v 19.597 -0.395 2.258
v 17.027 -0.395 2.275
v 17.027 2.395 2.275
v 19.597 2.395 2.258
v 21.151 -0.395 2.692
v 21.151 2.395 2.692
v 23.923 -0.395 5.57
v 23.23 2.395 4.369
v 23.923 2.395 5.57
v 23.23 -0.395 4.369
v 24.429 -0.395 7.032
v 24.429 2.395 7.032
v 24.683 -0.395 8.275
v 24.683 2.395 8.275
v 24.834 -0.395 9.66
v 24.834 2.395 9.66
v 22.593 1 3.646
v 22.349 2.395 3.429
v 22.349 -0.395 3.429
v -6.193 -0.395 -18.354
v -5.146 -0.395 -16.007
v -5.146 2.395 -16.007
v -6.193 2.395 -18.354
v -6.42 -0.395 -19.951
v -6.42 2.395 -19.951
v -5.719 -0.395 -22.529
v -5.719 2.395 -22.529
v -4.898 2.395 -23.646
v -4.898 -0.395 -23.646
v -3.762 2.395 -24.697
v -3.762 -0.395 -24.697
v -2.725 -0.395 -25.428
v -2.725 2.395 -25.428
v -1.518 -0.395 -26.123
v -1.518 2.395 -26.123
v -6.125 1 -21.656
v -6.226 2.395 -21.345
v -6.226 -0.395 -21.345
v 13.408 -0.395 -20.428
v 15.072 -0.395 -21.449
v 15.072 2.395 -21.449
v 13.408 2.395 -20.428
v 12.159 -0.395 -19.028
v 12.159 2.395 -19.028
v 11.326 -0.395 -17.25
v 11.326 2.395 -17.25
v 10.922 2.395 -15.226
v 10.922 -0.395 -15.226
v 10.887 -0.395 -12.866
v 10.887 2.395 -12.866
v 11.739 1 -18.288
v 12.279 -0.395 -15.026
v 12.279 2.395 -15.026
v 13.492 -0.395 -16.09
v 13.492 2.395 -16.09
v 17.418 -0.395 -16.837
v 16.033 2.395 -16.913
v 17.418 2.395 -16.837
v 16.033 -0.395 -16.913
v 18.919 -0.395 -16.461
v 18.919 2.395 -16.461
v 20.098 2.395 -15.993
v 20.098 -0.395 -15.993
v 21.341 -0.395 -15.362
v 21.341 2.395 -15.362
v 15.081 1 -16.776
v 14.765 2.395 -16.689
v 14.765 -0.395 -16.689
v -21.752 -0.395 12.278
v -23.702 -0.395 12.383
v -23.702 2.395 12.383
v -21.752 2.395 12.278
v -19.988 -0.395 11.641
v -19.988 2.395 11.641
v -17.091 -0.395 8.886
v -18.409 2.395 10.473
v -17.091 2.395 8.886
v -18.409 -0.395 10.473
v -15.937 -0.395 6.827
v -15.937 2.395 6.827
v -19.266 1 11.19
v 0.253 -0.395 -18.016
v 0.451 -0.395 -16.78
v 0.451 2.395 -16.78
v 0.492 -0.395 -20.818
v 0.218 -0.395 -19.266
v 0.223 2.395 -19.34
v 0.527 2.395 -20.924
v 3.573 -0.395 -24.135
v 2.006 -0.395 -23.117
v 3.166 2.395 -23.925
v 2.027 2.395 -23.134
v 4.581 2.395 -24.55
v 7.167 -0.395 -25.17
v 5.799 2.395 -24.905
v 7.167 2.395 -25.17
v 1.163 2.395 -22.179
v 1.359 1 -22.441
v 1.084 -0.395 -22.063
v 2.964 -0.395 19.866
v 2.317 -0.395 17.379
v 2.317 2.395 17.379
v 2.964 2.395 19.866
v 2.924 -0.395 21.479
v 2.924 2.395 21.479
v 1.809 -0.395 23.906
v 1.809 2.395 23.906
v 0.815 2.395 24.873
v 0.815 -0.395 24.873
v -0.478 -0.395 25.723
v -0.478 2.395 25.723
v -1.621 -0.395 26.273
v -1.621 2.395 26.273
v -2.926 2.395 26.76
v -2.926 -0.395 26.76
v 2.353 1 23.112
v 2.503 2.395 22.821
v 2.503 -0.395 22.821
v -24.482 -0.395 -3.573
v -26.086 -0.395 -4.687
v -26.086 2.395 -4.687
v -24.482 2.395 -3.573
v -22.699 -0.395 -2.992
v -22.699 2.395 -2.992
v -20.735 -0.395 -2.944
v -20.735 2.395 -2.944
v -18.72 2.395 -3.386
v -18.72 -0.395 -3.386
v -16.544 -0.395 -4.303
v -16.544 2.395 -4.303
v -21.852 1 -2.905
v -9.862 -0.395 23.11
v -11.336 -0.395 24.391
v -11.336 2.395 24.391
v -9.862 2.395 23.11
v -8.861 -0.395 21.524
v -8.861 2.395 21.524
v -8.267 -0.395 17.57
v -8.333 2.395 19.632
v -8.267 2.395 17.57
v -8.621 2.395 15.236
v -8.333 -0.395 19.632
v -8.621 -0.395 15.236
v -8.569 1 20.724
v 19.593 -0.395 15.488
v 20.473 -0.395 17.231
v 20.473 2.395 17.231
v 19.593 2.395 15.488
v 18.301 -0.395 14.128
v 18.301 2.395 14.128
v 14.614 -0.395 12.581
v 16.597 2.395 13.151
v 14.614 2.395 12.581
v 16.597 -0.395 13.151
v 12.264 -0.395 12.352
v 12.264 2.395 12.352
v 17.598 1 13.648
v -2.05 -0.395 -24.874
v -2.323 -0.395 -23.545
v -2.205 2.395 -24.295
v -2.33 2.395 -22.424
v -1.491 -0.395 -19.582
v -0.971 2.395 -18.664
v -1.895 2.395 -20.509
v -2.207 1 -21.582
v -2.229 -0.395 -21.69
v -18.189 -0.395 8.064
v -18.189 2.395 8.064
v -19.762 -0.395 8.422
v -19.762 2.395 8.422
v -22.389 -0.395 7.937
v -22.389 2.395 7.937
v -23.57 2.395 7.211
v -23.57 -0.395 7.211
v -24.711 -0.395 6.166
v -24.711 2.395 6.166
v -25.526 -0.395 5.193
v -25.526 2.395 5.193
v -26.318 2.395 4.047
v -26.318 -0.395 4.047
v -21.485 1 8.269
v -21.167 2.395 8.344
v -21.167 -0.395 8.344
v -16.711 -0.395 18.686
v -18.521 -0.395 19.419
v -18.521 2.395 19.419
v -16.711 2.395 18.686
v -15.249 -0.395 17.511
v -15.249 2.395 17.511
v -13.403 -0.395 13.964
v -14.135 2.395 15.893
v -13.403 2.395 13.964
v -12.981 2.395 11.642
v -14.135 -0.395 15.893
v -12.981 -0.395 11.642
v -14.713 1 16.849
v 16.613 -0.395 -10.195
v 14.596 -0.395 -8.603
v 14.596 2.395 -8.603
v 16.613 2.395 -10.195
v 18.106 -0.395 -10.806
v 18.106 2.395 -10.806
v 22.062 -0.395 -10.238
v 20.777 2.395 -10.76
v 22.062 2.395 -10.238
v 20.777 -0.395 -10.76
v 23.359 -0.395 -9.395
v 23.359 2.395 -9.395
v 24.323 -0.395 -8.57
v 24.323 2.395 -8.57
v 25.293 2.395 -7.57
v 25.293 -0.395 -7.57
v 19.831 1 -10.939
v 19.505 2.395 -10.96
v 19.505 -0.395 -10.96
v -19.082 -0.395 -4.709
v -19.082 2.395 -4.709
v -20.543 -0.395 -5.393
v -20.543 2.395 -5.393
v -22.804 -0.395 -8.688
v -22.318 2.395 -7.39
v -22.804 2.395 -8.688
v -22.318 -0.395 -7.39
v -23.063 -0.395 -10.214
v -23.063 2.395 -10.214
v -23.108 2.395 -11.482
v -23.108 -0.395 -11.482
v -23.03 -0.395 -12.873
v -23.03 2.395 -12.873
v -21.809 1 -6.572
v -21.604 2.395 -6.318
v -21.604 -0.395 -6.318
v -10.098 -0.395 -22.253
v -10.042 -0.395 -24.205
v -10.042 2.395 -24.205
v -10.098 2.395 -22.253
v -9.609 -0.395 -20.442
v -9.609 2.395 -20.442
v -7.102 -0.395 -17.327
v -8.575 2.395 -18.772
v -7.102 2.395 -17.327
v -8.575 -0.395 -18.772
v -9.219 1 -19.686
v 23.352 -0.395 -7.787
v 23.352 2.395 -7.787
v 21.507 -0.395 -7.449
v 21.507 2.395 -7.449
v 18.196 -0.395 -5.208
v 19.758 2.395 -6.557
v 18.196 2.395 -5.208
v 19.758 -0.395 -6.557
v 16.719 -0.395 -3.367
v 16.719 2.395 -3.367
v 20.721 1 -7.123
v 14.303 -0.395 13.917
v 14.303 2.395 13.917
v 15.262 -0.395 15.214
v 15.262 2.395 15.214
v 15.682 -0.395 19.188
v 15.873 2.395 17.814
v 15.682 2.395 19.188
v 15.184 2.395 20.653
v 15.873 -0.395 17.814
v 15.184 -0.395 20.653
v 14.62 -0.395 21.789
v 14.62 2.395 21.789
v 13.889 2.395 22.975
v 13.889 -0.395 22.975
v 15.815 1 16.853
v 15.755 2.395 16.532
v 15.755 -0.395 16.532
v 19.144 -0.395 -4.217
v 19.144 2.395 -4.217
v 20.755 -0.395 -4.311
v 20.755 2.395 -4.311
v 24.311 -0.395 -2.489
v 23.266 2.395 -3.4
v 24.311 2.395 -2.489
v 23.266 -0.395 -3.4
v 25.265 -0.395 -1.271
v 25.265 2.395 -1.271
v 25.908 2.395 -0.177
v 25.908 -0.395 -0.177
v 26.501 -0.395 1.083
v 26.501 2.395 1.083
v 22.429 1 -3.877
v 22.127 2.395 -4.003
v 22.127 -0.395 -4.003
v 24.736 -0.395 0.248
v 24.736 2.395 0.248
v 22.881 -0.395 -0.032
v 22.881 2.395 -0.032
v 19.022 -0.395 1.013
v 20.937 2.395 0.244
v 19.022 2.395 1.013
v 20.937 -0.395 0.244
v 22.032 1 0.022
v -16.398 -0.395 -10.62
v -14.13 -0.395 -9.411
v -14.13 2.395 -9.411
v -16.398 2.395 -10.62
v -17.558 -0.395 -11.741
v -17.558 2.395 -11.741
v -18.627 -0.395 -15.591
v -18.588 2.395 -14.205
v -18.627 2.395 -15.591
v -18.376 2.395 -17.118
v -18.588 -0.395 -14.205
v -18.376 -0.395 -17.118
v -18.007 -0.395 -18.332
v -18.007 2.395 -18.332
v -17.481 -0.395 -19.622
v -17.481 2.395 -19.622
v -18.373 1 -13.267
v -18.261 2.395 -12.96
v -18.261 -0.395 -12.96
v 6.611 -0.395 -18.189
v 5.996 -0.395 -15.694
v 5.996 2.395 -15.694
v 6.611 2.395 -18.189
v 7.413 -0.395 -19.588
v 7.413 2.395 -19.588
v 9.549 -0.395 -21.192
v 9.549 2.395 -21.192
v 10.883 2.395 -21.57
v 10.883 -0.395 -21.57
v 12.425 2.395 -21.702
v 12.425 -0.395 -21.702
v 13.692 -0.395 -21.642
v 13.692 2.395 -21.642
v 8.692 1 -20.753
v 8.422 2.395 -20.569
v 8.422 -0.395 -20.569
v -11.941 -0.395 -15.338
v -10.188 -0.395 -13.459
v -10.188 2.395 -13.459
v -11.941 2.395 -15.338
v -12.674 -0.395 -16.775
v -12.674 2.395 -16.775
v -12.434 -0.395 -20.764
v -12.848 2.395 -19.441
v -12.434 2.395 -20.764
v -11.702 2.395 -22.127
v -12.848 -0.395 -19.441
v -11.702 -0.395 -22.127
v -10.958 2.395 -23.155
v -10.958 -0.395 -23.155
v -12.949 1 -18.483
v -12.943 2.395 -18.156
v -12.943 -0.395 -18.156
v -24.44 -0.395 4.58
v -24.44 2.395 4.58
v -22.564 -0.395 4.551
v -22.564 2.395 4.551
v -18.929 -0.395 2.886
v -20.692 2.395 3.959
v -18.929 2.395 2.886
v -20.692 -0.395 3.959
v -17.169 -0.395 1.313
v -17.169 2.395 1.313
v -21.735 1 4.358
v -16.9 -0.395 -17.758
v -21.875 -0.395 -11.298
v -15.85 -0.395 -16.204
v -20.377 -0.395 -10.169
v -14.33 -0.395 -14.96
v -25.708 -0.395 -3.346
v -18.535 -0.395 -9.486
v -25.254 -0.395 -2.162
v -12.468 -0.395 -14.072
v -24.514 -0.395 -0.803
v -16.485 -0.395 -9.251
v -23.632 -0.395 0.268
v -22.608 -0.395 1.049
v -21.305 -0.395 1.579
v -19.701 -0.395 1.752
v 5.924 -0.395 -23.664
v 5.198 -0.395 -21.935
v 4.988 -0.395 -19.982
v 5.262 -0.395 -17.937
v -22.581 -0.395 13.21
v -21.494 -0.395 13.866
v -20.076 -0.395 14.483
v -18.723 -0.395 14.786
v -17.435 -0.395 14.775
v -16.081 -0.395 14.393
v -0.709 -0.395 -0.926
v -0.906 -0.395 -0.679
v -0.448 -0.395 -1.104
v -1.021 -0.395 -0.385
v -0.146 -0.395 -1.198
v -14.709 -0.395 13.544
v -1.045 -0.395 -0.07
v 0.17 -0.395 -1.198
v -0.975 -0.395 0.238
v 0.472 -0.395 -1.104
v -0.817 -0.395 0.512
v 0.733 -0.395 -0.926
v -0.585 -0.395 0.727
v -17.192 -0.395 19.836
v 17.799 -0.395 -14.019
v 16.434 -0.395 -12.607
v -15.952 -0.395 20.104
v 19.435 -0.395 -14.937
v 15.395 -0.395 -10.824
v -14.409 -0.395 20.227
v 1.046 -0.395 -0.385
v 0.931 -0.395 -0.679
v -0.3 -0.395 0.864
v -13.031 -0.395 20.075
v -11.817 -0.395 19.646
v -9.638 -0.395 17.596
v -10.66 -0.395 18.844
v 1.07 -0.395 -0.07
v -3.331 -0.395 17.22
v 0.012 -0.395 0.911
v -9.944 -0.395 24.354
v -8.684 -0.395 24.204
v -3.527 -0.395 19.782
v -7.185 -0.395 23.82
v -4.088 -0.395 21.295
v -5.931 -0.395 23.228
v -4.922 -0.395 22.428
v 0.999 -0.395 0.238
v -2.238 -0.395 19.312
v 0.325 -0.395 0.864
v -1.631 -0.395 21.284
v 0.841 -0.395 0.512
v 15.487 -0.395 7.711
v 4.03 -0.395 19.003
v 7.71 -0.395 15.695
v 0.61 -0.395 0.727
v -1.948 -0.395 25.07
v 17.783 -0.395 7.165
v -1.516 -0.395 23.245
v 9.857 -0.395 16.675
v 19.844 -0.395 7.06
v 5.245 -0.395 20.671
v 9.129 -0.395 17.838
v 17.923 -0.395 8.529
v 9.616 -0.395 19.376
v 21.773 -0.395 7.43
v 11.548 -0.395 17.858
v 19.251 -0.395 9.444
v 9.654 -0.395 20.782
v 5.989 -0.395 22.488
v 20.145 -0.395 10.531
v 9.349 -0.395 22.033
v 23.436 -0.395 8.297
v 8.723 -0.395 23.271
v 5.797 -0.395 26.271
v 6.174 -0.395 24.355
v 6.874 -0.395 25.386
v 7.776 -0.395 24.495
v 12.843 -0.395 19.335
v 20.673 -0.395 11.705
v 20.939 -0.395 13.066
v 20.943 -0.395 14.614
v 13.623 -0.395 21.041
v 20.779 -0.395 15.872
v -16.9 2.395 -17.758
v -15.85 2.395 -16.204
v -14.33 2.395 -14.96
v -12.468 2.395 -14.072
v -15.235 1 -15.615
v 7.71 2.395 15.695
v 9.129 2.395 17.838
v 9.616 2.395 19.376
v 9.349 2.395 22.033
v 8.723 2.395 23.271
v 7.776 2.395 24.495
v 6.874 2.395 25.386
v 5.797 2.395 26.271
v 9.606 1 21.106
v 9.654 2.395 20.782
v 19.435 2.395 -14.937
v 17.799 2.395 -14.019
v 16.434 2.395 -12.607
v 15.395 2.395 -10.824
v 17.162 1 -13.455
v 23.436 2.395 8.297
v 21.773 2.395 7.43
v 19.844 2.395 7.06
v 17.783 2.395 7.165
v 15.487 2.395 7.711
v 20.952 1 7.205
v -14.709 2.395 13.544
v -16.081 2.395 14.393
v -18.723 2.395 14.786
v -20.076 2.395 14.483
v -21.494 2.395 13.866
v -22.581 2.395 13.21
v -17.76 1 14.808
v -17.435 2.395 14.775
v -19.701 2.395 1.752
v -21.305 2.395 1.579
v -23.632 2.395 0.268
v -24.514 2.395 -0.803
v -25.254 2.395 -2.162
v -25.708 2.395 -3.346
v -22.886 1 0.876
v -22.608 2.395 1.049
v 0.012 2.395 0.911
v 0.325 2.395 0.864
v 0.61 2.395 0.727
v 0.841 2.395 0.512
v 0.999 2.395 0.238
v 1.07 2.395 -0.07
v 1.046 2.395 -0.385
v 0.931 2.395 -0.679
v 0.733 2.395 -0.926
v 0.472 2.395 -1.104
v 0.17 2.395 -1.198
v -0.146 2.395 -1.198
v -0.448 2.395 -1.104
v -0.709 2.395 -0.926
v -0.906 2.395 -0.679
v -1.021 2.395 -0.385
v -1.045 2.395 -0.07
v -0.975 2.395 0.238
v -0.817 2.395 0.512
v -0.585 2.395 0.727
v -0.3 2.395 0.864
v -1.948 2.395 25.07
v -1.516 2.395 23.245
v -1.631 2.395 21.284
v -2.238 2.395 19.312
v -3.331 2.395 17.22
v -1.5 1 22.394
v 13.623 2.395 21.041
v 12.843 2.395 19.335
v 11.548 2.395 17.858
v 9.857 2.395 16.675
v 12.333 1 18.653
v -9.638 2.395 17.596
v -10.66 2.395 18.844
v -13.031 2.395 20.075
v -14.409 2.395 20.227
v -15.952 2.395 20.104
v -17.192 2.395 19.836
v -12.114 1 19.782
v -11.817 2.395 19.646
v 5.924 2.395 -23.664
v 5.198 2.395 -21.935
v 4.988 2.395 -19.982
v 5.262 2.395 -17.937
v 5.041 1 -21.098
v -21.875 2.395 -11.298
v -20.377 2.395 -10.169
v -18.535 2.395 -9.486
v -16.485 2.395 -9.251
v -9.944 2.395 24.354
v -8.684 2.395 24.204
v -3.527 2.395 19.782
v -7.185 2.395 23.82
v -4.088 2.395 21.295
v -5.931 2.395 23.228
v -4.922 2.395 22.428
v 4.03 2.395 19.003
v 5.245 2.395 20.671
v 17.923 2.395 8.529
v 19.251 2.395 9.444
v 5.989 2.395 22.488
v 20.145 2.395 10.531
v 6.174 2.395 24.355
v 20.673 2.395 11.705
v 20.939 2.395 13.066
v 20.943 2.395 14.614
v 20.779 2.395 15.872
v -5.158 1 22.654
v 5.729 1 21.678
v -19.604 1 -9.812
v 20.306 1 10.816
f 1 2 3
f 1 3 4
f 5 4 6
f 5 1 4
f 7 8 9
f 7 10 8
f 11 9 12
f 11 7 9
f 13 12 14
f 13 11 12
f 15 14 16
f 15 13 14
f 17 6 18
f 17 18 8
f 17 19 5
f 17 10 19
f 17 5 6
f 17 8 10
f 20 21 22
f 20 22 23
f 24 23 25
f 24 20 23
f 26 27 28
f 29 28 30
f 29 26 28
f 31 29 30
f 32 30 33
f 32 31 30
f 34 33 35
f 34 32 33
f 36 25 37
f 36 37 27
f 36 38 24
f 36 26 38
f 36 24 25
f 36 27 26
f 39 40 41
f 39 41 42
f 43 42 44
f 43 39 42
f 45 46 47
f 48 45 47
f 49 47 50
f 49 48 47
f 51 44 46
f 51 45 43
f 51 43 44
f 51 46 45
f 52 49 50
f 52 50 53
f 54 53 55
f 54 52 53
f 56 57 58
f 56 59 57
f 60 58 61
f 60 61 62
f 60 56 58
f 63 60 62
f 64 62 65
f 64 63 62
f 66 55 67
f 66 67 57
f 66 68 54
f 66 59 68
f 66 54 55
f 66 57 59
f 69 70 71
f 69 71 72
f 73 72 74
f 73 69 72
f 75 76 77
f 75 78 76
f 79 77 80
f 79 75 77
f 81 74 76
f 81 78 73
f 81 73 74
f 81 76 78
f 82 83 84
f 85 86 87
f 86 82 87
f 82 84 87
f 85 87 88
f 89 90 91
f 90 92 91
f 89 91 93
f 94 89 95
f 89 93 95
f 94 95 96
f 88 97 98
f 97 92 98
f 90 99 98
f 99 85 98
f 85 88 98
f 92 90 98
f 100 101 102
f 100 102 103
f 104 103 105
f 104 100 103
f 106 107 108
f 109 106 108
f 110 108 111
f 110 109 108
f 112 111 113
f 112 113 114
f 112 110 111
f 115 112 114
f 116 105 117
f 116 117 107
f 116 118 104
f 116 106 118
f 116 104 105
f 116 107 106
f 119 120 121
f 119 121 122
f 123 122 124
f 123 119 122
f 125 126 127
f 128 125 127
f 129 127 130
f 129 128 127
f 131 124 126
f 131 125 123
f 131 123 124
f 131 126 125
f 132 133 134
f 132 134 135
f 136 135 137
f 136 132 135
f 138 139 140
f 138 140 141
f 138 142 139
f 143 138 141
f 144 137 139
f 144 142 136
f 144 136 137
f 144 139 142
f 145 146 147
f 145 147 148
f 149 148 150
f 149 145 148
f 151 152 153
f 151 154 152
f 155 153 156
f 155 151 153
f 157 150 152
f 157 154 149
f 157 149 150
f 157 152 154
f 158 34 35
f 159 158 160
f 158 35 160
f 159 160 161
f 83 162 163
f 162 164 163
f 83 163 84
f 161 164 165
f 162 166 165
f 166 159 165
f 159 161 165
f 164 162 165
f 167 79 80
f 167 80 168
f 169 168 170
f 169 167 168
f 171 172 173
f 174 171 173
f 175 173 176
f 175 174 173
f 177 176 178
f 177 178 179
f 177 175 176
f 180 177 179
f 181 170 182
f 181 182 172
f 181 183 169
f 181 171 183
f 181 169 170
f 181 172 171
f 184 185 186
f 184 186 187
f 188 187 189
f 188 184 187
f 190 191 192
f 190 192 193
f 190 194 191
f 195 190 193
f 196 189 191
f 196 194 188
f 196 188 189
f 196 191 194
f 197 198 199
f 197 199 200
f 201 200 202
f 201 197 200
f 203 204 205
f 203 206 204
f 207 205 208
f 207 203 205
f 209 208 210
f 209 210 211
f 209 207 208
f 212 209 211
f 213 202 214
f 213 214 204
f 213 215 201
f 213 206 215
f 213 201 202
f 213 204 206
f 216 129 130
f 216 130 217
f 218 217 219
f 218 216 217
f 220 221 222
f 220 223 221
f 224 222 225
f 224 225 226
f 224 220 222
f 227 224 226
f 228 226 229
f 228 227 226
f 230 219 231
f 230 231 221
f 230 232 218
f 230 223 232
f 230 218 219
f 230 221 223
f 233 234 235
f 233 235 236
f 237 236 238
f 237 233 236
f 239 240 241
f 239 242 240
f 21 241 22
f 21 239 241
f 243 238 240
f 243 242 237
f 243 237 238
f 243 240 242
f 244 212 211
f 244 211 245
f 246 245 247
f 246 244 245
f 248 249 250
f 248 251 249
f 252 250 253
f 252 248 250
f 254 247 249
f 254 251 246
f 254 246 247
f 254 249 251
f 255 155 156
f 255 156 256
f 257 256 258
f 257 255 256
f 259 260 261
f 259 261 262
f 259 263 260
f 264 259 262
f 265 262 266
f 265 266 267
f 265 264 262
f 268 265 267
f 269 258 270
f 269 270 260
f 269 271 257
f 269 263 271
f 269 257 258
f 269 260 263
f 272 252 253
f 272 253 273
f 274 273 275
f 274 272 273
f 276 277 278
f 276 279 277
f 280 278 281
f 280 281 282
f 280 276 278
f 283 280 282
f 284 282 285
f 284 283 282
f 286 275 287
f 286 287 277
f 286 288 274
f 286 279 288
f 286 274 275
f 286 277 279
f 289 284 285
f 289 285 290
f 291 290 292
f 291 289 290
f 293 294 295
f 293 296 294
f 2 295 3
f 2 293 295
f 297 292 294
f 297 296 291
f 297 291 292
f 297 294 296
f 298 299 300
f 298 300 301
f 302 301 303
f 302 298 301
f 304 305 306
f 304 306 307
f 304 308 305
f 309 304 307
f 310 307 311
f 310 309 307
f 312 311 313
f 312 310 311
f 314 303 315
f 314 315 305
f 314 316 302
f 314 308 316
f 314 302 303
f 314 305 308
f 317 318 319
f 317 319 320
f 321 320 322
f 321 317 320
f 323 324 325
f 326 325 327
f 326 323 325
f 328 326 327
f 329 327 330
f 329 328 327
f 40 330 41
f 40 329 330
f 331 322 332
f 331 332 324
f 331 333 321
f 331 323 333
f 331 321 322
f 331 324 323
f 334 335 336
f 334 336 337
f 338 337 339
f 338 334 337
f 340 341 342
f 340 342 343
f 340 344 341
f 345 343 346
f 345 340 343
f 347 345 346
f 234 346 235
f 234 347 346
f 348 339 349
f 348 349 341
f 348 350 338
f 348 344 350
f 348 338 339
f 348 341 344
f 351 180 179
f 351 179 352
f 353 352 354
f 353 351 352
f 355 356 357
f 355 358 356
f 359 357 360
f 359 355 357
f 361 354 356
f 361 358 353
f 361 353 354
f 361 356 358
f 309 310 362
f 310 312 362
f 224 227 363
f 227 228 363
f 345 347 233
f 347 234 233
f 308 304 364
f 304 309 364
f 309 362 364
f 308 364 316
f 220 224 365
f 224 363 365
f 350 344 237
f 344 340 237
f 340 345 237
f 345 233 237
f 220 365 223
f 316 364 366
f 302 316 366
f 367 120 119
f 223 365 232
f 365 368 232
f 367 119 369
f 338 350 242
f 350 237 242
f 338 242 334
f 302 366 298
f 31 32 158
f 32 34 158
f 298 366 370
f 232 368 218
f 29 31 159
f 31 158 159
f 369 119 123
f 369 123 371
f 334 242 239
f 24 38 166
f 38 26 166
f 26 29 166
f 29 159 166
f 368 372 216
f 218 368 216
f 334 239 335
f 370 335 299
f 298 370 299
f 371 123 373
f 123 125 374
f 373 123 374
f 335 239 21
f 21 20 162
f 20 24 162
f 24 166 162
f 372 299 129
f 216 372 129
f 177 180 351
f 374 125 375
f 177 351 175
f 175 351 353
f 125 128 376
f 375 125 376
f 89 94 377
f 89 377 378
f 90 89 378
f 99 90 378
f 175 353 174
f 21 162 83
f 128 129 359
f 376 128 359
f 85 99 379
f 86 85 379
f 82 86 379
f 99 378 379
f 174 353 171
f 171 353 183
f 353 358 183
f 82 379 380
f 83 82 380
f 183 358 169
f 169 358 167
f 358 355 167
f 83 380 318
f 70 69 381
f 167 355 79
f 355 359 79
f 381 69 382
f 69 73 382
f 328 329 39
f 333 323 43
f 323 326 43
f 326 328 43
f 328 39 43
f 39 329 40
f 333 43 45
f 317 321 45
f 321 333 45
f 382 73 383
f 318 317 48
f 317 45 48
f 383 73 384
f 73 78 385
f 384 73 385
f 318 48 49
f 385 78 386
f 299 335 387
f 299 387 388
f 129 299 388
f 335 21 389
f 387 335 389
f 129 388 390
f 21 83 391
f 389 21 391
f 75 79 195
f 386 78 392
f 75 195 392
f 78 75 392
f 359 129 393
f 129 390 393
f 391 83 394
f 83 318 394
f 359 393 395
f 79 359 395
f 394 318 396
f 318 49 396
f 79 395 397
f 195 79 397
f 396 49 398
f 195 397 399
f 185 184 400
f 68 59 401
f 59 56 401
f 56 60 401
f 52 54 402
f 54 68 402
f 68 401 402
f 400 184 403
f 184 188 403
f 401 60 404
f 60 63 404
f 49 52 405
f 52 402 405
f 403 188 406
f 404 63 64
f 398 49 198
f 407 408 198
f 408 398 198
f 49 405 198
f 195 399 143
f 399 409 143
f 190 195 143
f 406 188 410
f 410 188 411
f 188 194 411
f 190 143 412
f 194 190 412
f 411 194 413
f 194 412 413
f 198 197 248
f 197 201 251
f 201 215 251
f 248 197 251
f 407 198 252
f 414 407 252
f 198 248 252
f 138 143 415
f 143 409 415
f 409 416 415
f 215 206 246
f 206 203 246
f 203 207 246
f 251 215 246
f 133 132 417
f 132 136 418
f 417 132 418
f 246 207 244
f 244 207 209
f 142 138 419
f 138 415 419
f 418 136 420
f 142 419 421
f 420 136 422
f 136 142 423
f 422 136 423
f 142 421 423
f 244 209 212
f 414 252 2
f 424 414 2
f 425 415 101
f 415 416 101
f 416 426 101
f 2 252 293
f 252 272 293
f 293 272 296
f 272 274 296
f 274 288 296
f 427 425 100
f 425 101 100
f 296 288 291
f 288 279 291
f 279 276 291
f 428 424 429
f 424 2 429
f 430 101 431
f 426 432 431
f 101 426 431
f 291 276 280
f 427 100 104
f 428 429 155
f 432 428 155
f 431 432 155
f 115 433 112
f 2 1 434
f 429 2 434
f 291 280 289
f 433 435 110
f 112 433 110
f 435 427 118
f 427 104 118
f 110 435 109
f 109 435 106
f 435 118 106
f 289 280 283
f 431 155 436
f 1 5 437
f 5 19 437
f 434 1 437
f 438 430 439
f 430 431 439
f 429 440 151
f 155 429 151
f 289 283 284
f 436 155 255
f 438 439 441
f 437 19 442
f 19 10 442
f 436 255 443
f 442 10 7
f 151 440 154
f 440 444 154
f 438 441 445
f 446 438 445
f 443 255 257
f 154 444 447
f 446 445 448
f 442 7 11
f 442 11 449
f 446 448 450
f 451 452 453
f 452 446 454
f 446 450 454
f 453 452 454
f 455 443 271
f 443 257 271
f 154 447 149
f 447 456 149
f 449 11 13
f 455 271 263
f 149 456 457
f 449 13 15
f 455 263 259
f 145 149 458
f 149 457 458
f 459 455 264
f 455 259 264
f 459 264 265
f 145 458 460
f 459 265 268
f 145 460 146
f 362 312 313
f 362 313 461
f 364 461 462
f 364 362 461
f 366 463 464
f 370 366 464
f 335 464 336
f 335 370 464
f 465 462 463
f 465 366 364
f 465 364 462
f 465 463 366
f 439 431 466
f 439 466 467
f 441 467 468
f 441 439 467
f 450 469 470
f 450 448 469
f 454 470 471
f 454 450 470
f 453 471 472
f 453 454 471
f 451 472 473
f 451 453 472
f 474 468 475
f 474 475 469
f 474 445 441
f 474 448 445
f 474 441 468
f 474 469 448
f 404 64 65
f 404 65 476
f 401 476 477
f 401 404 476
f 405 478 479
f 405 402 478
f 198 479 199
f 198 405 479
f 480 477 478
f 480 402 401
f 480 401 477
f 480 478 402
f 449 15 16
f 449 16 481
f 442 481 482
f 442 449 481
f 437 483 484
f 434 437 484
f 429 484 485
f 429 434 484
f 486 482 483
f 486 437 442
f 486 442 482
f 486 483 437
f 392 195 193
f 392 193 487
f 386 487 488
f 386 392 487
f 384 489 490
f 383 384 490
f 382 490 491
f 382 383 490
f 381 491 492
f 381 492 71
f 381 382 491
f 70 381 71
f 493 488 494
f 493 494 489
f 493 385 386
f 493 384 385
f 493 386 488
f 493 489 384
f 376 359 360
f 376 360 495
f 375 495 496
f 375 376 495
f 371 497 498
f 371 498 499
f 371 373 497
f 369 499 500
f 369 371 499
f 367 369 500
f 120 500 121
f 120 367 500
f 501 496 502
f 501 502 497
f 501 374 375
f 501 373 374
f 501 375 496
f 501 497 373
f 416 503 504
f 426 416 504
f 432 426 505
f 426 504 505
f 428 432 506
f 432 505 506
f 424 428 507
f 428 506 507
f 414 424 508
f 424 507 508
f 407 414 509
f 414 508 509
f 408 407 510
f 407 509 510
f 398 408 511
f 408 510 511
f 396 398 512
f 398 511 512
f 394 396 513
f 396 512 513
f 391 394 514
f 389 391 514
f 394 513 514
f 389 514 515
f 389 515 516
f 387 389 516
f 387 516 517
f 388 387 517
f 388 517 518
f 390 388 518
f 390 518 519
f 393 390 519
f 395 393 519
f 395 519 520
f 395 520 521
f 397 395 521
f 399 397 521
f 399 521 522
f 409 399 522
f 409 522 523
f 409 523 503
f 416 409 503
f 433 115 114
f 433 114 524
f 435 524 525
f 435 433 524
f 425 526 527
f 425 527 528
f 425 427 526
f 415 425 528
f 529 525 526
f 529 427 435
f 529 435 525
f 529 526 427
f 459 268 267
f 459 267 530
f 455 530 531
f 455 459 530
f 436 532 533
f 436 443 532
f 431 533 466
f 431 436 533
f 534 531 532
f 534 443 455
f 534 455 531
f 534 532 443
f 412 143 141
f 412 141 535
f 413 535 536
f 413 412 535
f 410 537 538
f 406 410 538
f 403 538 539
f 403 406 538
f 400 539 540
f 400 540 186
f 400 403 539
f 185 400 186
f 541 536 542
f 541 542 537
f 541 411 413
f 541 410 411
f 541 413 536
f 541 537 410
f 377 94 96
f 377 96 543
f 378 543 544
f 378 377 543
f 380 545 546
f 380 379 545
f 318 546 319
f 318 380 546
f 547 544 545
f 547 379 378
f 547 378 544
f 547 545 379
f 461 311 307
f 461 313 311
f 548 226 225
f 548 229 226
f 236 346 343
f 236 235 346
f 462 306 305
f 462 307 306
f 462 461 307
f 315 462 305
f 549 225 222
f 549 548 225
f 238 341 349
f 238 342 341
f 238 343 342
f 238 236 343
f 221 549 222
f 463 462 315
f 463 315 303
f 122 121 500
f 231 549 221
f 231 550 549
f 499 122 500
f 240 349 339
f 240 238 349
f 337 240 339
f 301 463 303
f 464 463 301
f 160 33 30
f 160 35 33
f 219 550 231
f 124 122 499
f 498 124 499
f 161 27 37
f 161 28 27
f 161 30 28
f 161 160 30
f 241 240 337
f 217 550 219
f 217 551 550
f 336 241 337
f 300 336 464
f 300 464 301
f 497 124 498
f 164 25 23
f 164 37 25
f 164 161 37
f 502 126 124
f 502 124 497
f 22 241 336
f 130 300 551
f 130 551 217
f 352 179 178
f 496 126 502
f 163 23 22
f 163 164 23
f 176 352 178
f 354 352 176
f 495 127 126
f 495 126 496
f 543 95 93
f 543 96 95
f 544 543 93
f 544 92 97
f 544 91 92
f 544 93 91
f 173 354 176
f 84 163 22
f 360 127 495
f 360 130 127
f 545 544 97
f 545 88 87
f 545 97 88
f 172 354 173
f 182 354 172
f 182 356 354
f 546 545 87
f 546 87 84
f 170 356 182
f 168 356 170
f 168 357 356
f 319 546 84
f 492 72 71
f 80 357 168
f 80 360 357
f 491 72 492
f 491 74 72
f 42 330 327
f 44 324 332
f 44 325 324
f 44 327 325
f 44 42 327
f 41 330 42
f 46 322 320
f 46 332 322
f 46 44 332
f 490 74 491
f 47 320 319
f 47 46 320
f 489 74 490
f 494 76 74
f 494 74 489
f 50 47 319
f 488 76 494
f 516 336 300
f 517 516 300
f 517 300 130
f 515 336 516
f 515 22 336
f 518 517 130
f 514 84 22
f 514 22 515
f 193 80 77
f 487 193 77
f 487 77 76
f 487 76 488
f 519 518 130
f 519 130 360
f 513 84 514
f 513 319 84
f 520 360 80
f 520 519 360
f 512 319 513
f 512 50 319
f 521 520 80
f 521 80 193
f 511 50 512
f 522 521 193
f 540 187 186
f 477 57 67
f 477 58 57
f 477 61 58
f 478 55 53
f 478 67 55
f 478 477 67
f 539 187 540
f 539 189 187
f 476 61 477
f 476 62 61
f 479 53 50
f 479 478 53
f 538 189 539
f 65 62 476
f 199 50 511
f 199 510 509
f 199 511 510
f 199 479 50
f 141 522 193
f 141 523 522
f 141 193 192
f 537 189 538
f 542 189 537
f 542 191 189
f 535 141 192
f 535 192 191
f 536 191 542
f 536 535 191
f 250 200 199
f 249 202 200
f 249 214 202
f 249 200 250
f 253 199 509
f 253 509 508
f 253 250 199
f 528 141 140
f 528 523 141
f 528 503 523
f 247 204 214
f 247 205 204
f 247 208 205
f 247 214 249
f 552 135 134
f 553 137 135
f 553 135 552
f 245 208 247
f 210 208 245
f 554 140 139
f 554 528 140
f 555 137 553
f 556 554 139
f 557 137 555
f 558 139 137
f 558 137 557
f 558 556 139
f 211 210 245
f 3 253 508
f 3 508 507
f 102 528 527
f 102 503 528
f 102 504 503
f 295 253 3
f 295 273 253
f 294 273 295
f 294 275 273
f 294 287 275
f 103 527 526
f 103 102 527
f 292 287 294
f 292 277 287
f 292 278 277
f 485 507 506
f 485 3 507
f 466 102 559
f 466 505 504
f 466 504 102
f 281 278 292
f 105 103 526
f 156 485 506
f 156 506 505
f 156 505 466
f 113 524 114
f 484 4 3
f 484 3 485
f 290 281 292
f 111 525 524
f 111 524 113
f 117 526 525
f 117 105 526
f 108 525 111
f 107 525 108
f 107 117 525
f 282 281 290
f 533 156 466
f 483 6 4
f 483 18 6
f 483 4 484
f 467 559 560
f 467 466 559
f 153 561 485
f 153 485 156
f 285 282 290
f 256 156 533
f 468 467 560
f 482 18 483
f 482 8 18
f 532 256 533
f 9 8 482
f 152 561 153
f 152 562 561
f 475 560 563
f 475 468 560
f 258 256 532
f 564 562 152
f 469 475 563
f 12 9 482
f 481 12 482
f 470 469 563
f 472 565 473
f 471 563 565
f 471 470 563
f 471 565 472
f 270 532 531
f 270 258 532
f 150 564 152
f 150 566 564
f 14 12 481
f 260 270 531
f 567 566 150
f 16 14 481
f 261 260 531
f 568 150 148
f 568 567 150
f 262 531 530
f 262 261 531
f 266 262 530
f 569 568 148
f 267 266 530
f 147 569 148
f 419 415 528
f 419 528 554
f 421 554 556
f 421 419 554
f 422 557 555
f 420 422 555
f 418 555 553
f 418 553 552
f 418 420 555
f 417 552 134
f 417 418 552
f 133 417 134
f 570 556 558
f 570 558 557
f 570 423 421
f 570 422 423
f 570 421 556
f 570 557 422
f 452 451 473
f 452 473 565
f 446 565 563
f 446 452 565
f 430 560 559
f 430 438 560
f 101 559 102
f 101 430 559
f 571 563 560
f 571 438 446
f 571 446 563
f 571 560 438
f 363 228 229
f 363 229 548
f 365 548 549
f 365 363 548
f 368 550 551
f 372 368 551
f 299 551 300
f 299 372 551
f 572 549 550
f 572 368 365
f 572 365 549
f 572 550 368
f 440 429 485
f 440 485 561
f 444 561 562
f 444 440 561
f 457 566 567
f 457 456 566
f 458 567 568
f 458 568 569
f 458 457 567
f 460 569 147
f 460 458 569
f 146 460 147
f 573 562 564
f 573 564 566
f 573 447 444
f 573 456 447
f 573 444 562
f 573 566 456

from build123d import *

# Parameters (mm, degrees)
SKETCH1_R           = 20
BOSS_EXTRUDE1_DEPTH = 2
CUT_EXTRUDE10_DEPTH = 29.354893758
CIRPATTERN1_DEPTH   = 2
SKETCH5_R           = 0.76
CUT_EXTRUDE11_DEPTH = 28.141520821
SCALE1_SCALE        = 1.5
SCALE2_SCALE        = 0.93


# Read off the part's stored shape, not the designer's step: CirPattern1
with BuildPart() as part:
    # Sketch1 → Boss-Extrude1 (new body)
    with BuildSketch(Plane(origin=(0, 0, 0), x_dir=(1, 0, 0), z_dir=(0, 1, 0))):
        with Locations(Location((0, 0, 0), (0, 0, 270))):
            Circle(SKETCH1_R)
    extrude(amount=BOSS_EXTRUDE1_DEPTH)

    # Sketch3 → Cut-Extrude10 (cut, through all)
    with BuildSketch(Plane(origin=(0, 2, 0), x_dir=(1, 0, 0), z_dir=(0, 1, 0))):
        with BuildLine():
            Line((-0.11374729, 19.999676536), (2.525531299, 21.841438752))
            Line((2.525531299, 21.841438752), (8.448237607, 18.128079913))
            add(Edge.make_bspline(
                [(0.314716636, 11.921594207), (-1.061906761, 18.280624108), (8.448237607, 18.128079913)],
                knots=[0, 0, 0, 1, 1, 1], degree=2))
            add(Edge.make_bspline(
                [(-0.11374729, 19.999676536), (-3.476973379, 16.23883842), (0.314716636, 11.921594207)],
                knots=[0, 0, 0, 1, 1, 1], degree=2))
        make_face()
    extrude(amount=-CUT_EXTRUDE10_DEPTH, mode=Mode.SUBTRACT)

    # CirPattern1 outline → CirPattern1 (cut)
    with BuildSketch(Plane(origin=(0, 0, 0), x_dir=(1, 0, 0), z_dir=(0, 1, 0))):
        with BuildLine():
            add(Edge.make_bspline(
                [(-7.207557435, 17.244057808), (-7.782239787, 13.703261178), (-3.697405485, 11.367556407)],
                knots=[0.181076354, 0.181076354, 0.181076354, 1, 1, 1], degree=2))
            add(Edge.make_bspline(
                [(-3.697405485, 11.367556407), (-6.402099222, 15.840148745), (-1.097148713, 18.619435028)],
                knots=[0, 0, 0, 0.803340706, 0.803340706, 0.803340706], degree=2))
            add(Edge.make_bspline(
                [(-0.11374729, 19.999676536), (-0.722748007, 19.318677683), (-1.097148713, 18.619435028)],
                knots=[0, 0, 0, 0.181076354, 0.181076354, 0.181076354], degree=2))
            ThreePointArc((-0.11374729, 19.999676536), (-4.271024547, -19.538637345), (8.448237607, 18.128079913))
            add(Edge.make_bspline(
                [(5.128765463, 17.936244047), (6.577979327, 18.158079147), (8.448237607, 18.128079913)],
                knots=[0.803340706, 0.803340706, 0.803340706, 1, 1, 1], degree=2))
            add(Edge.make_bspline(
                [(5.128765463, 17.936244047), (2.500458036, 15.495035196), (4.289346694, 11.142878787)],
                knots=[0.181076354, 0.181076354, 0.181076354, 1, 1, 1], degree=2))
            add(Edge.make_bspline(
                [(4.289346694, 11.142878787), (4.902086374, 16.33363986), (10.795510687, 15.268519209)],
                knots=[0, 0, 0, 0.803340706, 0.803340706, 0.803340706], degree=2))
            add(Edge.make_bspline(
                [(10.795510687, 15.268519209), (7.516952988, 13.812991814), (7.795771849, 9.115796046)],
                knots=[0.181076354, 0.181076354, 0.181076354, 1, 1, 1], degree=2))
            add(Edge.make_bspline(
                [(7.795771849, 9.115796046), (10.060748967, 13.826351118), (15.289007186, 10.905349896)],
                knots=[0, 0, 0, 0.803340706, 0.803340706, 0.803340706], degree=2))
            add(Edge.make_bspline(
                [(15.289007186, 10.905349896), (11.715481814, 10.593232934), (10.454016527, 6.060011853)],
                knots=[0.181076354, 0.181076354, 0.181076354, 1, 1, 1], degree=2))
            add(Edge.make_bspline(
                [(10.454016527, 6.060011853), (14.125785669, 9.779899189), (18.12231489, 5.319553202)],
                knots=[0, 0, 0, 0.803340706, 0.803340706, 0.803340706], degree=2))
            add(Edge.make_bspline(
                [(18.12231489, 5.319553202), (14.641068768, 6.18466939), (11.97601867, 2.306667841)],
                knots=[0.181076354, 0.181076354, 0.181076354, 1, 1, 1], degree=2))
            add(Edge.make_bspline(
                [(11.97601867, 2.306667841), (16.656686676, 4.632779929), (18.988400946, -0.883563127)],
                knots=[0, 0, 0, 0.803340706, 0.803340706, 0.803340706], degree=2))
            add(Edge.make_bspline(
                [(18.988400946, -0.883563127), (15.976681108, 1.065037449), (12.196845731, -1.737502929)],
                knots=[0.181076354, 0.181076354, 0.181076354, 1, 1, 1], degree=2))
            add(Edge.make_bspline(
                [(12.196845731, -1.737502929), (17.379189594, -1.057236426), (17.793411491, -7.031795185)],
                knots=[0, 0, 0, 0.803340706, 0.803340706, 0.803340706], degree=2))
            add(Edge.make_bspline(
                [(17.793411491, -7.031795185), (15.577584513, -4.210871331), (11.09256767, -5.6342518)],
                knots=[0.181076354, 0.181076354, 0.181076354, 1, 1, 1], degree=2))
            add(Edge.make_bspline(
                [(11.09256767, -5.6342518), (16.215000021, -6.673548315), (14.666842175, -12.458886631)],
                knots=[0, 0, 0, 0.803340706, 0.803340706, 0.803340706], degree=2))
            add(Edge.make_bspline(
                [(14.666842175, -12.458886631), (13.487027293, -9.071330369), (8.782850151, -8.961305569)],
                knots=[0.181076354, 0.181076354, 0.181076354, 1, 1, 1], degree=2))
            add(Edge.make_bspline(
                [(8.782850151, -8.961305569), (13.29027596, -11.607541197), (9.947505297, -16.576727895)],
                knots=[0, 0, 0, 0.803340706, 0.803340706, 0.803340706], degree=2))
            add(Edge.make_bspline(
                [(9.947505297, -16.576727895), (9.93155376, -12.989633509), (5.517986904, -11.358126335)],
                knots=[0.181076354, 0.181076354, 0.181076354, 1, 1, 1], degree=2))
            add(Edge.make_bspline(
                [(5.517986904, -11.358126335), (8.921956647, -15.324540386), (4.146814235, -18.939086981)],
                knots=[0, 0, 0, 0.803340706, 0.803340706, 0.803340706], degree=2))
            add(Edge.make_bspline(
                [(4.146814235, -18.939086981), (5.296454639, -15.541171808), (1.651776524, -12.564981378)],
                knots=[0.181076354, 0.181076354, 0.181076354, 1, 1, 1], degree=2))
            add(Edge.make_bspline(
                [(1.651776524, -12.564981378), (3.58341726, -17.421751343), (-2.106636126, -19.289965628)],
                knots=[0, 0, 0, 0.803340706, 0.803340706, 0.803340706], degree=2))
            add(Edge.make_bspline(
                [(-2.106636126, -19.289965628), (0.084014843, -16.4494465), (-2.396817106, -12.451089227)],
                knots=[0.181076354, 0.181076354, 0.181076354, 1, 1, 1], degree=2))
            add(Edge.make_bspline(
                [(-2.396817106, -12.451089227), (-2.146828623, -17.671908721), (-8.135187408, -17.591340689)],
                knots=[0, 0, 0, 0.803340706, 0.803340706, 0.803340706], degree=2))
            add(Edge.make_bspline(
                [(-8.135187408, -17.591340689), (-5.140916898, -15.616031929), (-6.189066045, -11.028791865)],
                knots=[0.181076354, 0.181076354, 0.181076354, 1, 1, 1], degree=2))
            add(Edge.make_bspline(
                [(-6.189066045, -11.028791865), (-7.647819946, -16.047904086), (-13.285552537, -14.027284533)],
                knots=[0, 0, 0, 0.803340706, 0.803340706, 0.803340706], degree=2))
            add(Edge.make_bspline(
                [(-13.285552537, -14.027284533), (-9.812138156, -13.131241495), (-9.314021278, -8.452217279)],
                knots=[0.181076354, 0.181076354, 0.181076354, 1, 1, 1], degree=2))
            add(Edge.make_bspline(
                [(-9.314021278, -8.452217279), (-12.323438943, -12.725723538), (-16.999609535, -8.984017946)],
                knots=[0, 0, 0, 0.803340706, 0.803340706, 0.803340706], degree=2))
            add(Edge.make_bspline(
                [(-16.999609535, -8.984017946), (-13.423449627, -9.264340798), (-11.433045416, -5.000577306)],
                knots=[0.181076354, 0.181076354, 0.181076354, 1, 1, 1], degree=2))
            add(Edge.make_bspline(
                [(-11.433045416, -5.000577306), (-15.667009745, -8.06537689), (-18.874882696, -3.008057118)],
                knots=[0, 0, 0, 0.803340706, 0.803340706, 0.803340706], degree=2))
            add(Edge.make_bspline(
                [(-18.874882696, -3.008057118), (-15.583509678, -4.434368529), (-12.316509314, -1.047910694)],
                knots=[0.181076354, 0.181076354, 0.181076354, 1, 1, 1], degree=2))
            add(Edge.make_bspline(
                [(-12.316509314, -1.047910694), (-17.316204575, -2.571885013), (-18.708157077, 3.253009868)],
                knots=[0, 0, 0, 0.803340706, 0.803340706, 0.803340706], degree=2))
            add(Edge.make_bspline(
                [(-18.708157077, 3.253009868), (-16.058242285, 0.835272872), (-11.868675951, 2.977449797)],
                knots=[0.181076354, 0.181076354, 0.181076354, 1, 1, 1], degree=2))
            add(Edge.make_bspline(
                [(-11.868675951, 2.977449797), (-17.092307584, 3.159447008), (-16.517499984, 9.120699256)],
                knots=[0, 0, 0, 0.803340706, 0.803340706, 0.803340706], degree=2))
            add(Edge.make_bspline(
                [(-16.517499984, 9.120699256), (-14.796202804, 5.973535993), (-10.13807502, 6.639293898)],
                knots=[0.181076354, 0.181076354, 0.181076354, 1, 1, 1], degree=2))
            add(Edge.make_bspline(
                [(-10.13807502, 6.639293898), (-15.019581485, 8.507540416), (-12.540303105, 13.959155852)],
                knots=[0, 0, 0, 0.803340706, 0.803340706, 0.803340706], degree=2))
            add(Edge.make_bspline(
                [(-12.540303105, 13.959155852), (-11.934152795, 10.423610295), (-7.312243985, 9.540803981)],
                knots=[0.181076354, 0.181076354, 0.181076354, 1, 1, 1], degree=2))
            add(Edge.make_bspline(
                [(-7.312243985, 9.540803981), (-11.322638312, 12.892846308), (-7.207557435, 17.244057808)],
                knots=[0, 0, 0, 0.803340706, 0.803340706, 0.803340706], degree=2))
        make_face()
    extrude(amount=CIRPATTERN1_DEPTH, mode=Mode.SUBTRACT)

    # Sketch5 → Cut-Extrude11 (cut, through all)
    with BuildSketch(Plane(origin=(0, 2, 0), x_dir=(1, 0, 0), z_dir=(0, 1, 0))):
        with Locations(Location((0, 0, 0), (0, 0, 270))):
            Circle(SKETCH5_R)
    extrude(amount=-CUT_EXTRUDE11_DEPTH, mode=Mode.SUBTRACT)


with BuildPart() as part_1:
    # Scale1: scaled about (-0.031329983, 0.999999987, 0.377918145)
    add(part.part.scale(SCALE1_SCALE).moved(Location((0.015664991, -0.499999994, -0.188959072))))


with BuildPart() as part_2:
    # Scale2: scaled about (-0.031329983, 0.999999987, 0.377918146)
    add(part_1.part.scale(SCALE2_SCALE).moved(Location((-0.002193099, 0.069999999, 0.02645427))))


solid = part_2.part
